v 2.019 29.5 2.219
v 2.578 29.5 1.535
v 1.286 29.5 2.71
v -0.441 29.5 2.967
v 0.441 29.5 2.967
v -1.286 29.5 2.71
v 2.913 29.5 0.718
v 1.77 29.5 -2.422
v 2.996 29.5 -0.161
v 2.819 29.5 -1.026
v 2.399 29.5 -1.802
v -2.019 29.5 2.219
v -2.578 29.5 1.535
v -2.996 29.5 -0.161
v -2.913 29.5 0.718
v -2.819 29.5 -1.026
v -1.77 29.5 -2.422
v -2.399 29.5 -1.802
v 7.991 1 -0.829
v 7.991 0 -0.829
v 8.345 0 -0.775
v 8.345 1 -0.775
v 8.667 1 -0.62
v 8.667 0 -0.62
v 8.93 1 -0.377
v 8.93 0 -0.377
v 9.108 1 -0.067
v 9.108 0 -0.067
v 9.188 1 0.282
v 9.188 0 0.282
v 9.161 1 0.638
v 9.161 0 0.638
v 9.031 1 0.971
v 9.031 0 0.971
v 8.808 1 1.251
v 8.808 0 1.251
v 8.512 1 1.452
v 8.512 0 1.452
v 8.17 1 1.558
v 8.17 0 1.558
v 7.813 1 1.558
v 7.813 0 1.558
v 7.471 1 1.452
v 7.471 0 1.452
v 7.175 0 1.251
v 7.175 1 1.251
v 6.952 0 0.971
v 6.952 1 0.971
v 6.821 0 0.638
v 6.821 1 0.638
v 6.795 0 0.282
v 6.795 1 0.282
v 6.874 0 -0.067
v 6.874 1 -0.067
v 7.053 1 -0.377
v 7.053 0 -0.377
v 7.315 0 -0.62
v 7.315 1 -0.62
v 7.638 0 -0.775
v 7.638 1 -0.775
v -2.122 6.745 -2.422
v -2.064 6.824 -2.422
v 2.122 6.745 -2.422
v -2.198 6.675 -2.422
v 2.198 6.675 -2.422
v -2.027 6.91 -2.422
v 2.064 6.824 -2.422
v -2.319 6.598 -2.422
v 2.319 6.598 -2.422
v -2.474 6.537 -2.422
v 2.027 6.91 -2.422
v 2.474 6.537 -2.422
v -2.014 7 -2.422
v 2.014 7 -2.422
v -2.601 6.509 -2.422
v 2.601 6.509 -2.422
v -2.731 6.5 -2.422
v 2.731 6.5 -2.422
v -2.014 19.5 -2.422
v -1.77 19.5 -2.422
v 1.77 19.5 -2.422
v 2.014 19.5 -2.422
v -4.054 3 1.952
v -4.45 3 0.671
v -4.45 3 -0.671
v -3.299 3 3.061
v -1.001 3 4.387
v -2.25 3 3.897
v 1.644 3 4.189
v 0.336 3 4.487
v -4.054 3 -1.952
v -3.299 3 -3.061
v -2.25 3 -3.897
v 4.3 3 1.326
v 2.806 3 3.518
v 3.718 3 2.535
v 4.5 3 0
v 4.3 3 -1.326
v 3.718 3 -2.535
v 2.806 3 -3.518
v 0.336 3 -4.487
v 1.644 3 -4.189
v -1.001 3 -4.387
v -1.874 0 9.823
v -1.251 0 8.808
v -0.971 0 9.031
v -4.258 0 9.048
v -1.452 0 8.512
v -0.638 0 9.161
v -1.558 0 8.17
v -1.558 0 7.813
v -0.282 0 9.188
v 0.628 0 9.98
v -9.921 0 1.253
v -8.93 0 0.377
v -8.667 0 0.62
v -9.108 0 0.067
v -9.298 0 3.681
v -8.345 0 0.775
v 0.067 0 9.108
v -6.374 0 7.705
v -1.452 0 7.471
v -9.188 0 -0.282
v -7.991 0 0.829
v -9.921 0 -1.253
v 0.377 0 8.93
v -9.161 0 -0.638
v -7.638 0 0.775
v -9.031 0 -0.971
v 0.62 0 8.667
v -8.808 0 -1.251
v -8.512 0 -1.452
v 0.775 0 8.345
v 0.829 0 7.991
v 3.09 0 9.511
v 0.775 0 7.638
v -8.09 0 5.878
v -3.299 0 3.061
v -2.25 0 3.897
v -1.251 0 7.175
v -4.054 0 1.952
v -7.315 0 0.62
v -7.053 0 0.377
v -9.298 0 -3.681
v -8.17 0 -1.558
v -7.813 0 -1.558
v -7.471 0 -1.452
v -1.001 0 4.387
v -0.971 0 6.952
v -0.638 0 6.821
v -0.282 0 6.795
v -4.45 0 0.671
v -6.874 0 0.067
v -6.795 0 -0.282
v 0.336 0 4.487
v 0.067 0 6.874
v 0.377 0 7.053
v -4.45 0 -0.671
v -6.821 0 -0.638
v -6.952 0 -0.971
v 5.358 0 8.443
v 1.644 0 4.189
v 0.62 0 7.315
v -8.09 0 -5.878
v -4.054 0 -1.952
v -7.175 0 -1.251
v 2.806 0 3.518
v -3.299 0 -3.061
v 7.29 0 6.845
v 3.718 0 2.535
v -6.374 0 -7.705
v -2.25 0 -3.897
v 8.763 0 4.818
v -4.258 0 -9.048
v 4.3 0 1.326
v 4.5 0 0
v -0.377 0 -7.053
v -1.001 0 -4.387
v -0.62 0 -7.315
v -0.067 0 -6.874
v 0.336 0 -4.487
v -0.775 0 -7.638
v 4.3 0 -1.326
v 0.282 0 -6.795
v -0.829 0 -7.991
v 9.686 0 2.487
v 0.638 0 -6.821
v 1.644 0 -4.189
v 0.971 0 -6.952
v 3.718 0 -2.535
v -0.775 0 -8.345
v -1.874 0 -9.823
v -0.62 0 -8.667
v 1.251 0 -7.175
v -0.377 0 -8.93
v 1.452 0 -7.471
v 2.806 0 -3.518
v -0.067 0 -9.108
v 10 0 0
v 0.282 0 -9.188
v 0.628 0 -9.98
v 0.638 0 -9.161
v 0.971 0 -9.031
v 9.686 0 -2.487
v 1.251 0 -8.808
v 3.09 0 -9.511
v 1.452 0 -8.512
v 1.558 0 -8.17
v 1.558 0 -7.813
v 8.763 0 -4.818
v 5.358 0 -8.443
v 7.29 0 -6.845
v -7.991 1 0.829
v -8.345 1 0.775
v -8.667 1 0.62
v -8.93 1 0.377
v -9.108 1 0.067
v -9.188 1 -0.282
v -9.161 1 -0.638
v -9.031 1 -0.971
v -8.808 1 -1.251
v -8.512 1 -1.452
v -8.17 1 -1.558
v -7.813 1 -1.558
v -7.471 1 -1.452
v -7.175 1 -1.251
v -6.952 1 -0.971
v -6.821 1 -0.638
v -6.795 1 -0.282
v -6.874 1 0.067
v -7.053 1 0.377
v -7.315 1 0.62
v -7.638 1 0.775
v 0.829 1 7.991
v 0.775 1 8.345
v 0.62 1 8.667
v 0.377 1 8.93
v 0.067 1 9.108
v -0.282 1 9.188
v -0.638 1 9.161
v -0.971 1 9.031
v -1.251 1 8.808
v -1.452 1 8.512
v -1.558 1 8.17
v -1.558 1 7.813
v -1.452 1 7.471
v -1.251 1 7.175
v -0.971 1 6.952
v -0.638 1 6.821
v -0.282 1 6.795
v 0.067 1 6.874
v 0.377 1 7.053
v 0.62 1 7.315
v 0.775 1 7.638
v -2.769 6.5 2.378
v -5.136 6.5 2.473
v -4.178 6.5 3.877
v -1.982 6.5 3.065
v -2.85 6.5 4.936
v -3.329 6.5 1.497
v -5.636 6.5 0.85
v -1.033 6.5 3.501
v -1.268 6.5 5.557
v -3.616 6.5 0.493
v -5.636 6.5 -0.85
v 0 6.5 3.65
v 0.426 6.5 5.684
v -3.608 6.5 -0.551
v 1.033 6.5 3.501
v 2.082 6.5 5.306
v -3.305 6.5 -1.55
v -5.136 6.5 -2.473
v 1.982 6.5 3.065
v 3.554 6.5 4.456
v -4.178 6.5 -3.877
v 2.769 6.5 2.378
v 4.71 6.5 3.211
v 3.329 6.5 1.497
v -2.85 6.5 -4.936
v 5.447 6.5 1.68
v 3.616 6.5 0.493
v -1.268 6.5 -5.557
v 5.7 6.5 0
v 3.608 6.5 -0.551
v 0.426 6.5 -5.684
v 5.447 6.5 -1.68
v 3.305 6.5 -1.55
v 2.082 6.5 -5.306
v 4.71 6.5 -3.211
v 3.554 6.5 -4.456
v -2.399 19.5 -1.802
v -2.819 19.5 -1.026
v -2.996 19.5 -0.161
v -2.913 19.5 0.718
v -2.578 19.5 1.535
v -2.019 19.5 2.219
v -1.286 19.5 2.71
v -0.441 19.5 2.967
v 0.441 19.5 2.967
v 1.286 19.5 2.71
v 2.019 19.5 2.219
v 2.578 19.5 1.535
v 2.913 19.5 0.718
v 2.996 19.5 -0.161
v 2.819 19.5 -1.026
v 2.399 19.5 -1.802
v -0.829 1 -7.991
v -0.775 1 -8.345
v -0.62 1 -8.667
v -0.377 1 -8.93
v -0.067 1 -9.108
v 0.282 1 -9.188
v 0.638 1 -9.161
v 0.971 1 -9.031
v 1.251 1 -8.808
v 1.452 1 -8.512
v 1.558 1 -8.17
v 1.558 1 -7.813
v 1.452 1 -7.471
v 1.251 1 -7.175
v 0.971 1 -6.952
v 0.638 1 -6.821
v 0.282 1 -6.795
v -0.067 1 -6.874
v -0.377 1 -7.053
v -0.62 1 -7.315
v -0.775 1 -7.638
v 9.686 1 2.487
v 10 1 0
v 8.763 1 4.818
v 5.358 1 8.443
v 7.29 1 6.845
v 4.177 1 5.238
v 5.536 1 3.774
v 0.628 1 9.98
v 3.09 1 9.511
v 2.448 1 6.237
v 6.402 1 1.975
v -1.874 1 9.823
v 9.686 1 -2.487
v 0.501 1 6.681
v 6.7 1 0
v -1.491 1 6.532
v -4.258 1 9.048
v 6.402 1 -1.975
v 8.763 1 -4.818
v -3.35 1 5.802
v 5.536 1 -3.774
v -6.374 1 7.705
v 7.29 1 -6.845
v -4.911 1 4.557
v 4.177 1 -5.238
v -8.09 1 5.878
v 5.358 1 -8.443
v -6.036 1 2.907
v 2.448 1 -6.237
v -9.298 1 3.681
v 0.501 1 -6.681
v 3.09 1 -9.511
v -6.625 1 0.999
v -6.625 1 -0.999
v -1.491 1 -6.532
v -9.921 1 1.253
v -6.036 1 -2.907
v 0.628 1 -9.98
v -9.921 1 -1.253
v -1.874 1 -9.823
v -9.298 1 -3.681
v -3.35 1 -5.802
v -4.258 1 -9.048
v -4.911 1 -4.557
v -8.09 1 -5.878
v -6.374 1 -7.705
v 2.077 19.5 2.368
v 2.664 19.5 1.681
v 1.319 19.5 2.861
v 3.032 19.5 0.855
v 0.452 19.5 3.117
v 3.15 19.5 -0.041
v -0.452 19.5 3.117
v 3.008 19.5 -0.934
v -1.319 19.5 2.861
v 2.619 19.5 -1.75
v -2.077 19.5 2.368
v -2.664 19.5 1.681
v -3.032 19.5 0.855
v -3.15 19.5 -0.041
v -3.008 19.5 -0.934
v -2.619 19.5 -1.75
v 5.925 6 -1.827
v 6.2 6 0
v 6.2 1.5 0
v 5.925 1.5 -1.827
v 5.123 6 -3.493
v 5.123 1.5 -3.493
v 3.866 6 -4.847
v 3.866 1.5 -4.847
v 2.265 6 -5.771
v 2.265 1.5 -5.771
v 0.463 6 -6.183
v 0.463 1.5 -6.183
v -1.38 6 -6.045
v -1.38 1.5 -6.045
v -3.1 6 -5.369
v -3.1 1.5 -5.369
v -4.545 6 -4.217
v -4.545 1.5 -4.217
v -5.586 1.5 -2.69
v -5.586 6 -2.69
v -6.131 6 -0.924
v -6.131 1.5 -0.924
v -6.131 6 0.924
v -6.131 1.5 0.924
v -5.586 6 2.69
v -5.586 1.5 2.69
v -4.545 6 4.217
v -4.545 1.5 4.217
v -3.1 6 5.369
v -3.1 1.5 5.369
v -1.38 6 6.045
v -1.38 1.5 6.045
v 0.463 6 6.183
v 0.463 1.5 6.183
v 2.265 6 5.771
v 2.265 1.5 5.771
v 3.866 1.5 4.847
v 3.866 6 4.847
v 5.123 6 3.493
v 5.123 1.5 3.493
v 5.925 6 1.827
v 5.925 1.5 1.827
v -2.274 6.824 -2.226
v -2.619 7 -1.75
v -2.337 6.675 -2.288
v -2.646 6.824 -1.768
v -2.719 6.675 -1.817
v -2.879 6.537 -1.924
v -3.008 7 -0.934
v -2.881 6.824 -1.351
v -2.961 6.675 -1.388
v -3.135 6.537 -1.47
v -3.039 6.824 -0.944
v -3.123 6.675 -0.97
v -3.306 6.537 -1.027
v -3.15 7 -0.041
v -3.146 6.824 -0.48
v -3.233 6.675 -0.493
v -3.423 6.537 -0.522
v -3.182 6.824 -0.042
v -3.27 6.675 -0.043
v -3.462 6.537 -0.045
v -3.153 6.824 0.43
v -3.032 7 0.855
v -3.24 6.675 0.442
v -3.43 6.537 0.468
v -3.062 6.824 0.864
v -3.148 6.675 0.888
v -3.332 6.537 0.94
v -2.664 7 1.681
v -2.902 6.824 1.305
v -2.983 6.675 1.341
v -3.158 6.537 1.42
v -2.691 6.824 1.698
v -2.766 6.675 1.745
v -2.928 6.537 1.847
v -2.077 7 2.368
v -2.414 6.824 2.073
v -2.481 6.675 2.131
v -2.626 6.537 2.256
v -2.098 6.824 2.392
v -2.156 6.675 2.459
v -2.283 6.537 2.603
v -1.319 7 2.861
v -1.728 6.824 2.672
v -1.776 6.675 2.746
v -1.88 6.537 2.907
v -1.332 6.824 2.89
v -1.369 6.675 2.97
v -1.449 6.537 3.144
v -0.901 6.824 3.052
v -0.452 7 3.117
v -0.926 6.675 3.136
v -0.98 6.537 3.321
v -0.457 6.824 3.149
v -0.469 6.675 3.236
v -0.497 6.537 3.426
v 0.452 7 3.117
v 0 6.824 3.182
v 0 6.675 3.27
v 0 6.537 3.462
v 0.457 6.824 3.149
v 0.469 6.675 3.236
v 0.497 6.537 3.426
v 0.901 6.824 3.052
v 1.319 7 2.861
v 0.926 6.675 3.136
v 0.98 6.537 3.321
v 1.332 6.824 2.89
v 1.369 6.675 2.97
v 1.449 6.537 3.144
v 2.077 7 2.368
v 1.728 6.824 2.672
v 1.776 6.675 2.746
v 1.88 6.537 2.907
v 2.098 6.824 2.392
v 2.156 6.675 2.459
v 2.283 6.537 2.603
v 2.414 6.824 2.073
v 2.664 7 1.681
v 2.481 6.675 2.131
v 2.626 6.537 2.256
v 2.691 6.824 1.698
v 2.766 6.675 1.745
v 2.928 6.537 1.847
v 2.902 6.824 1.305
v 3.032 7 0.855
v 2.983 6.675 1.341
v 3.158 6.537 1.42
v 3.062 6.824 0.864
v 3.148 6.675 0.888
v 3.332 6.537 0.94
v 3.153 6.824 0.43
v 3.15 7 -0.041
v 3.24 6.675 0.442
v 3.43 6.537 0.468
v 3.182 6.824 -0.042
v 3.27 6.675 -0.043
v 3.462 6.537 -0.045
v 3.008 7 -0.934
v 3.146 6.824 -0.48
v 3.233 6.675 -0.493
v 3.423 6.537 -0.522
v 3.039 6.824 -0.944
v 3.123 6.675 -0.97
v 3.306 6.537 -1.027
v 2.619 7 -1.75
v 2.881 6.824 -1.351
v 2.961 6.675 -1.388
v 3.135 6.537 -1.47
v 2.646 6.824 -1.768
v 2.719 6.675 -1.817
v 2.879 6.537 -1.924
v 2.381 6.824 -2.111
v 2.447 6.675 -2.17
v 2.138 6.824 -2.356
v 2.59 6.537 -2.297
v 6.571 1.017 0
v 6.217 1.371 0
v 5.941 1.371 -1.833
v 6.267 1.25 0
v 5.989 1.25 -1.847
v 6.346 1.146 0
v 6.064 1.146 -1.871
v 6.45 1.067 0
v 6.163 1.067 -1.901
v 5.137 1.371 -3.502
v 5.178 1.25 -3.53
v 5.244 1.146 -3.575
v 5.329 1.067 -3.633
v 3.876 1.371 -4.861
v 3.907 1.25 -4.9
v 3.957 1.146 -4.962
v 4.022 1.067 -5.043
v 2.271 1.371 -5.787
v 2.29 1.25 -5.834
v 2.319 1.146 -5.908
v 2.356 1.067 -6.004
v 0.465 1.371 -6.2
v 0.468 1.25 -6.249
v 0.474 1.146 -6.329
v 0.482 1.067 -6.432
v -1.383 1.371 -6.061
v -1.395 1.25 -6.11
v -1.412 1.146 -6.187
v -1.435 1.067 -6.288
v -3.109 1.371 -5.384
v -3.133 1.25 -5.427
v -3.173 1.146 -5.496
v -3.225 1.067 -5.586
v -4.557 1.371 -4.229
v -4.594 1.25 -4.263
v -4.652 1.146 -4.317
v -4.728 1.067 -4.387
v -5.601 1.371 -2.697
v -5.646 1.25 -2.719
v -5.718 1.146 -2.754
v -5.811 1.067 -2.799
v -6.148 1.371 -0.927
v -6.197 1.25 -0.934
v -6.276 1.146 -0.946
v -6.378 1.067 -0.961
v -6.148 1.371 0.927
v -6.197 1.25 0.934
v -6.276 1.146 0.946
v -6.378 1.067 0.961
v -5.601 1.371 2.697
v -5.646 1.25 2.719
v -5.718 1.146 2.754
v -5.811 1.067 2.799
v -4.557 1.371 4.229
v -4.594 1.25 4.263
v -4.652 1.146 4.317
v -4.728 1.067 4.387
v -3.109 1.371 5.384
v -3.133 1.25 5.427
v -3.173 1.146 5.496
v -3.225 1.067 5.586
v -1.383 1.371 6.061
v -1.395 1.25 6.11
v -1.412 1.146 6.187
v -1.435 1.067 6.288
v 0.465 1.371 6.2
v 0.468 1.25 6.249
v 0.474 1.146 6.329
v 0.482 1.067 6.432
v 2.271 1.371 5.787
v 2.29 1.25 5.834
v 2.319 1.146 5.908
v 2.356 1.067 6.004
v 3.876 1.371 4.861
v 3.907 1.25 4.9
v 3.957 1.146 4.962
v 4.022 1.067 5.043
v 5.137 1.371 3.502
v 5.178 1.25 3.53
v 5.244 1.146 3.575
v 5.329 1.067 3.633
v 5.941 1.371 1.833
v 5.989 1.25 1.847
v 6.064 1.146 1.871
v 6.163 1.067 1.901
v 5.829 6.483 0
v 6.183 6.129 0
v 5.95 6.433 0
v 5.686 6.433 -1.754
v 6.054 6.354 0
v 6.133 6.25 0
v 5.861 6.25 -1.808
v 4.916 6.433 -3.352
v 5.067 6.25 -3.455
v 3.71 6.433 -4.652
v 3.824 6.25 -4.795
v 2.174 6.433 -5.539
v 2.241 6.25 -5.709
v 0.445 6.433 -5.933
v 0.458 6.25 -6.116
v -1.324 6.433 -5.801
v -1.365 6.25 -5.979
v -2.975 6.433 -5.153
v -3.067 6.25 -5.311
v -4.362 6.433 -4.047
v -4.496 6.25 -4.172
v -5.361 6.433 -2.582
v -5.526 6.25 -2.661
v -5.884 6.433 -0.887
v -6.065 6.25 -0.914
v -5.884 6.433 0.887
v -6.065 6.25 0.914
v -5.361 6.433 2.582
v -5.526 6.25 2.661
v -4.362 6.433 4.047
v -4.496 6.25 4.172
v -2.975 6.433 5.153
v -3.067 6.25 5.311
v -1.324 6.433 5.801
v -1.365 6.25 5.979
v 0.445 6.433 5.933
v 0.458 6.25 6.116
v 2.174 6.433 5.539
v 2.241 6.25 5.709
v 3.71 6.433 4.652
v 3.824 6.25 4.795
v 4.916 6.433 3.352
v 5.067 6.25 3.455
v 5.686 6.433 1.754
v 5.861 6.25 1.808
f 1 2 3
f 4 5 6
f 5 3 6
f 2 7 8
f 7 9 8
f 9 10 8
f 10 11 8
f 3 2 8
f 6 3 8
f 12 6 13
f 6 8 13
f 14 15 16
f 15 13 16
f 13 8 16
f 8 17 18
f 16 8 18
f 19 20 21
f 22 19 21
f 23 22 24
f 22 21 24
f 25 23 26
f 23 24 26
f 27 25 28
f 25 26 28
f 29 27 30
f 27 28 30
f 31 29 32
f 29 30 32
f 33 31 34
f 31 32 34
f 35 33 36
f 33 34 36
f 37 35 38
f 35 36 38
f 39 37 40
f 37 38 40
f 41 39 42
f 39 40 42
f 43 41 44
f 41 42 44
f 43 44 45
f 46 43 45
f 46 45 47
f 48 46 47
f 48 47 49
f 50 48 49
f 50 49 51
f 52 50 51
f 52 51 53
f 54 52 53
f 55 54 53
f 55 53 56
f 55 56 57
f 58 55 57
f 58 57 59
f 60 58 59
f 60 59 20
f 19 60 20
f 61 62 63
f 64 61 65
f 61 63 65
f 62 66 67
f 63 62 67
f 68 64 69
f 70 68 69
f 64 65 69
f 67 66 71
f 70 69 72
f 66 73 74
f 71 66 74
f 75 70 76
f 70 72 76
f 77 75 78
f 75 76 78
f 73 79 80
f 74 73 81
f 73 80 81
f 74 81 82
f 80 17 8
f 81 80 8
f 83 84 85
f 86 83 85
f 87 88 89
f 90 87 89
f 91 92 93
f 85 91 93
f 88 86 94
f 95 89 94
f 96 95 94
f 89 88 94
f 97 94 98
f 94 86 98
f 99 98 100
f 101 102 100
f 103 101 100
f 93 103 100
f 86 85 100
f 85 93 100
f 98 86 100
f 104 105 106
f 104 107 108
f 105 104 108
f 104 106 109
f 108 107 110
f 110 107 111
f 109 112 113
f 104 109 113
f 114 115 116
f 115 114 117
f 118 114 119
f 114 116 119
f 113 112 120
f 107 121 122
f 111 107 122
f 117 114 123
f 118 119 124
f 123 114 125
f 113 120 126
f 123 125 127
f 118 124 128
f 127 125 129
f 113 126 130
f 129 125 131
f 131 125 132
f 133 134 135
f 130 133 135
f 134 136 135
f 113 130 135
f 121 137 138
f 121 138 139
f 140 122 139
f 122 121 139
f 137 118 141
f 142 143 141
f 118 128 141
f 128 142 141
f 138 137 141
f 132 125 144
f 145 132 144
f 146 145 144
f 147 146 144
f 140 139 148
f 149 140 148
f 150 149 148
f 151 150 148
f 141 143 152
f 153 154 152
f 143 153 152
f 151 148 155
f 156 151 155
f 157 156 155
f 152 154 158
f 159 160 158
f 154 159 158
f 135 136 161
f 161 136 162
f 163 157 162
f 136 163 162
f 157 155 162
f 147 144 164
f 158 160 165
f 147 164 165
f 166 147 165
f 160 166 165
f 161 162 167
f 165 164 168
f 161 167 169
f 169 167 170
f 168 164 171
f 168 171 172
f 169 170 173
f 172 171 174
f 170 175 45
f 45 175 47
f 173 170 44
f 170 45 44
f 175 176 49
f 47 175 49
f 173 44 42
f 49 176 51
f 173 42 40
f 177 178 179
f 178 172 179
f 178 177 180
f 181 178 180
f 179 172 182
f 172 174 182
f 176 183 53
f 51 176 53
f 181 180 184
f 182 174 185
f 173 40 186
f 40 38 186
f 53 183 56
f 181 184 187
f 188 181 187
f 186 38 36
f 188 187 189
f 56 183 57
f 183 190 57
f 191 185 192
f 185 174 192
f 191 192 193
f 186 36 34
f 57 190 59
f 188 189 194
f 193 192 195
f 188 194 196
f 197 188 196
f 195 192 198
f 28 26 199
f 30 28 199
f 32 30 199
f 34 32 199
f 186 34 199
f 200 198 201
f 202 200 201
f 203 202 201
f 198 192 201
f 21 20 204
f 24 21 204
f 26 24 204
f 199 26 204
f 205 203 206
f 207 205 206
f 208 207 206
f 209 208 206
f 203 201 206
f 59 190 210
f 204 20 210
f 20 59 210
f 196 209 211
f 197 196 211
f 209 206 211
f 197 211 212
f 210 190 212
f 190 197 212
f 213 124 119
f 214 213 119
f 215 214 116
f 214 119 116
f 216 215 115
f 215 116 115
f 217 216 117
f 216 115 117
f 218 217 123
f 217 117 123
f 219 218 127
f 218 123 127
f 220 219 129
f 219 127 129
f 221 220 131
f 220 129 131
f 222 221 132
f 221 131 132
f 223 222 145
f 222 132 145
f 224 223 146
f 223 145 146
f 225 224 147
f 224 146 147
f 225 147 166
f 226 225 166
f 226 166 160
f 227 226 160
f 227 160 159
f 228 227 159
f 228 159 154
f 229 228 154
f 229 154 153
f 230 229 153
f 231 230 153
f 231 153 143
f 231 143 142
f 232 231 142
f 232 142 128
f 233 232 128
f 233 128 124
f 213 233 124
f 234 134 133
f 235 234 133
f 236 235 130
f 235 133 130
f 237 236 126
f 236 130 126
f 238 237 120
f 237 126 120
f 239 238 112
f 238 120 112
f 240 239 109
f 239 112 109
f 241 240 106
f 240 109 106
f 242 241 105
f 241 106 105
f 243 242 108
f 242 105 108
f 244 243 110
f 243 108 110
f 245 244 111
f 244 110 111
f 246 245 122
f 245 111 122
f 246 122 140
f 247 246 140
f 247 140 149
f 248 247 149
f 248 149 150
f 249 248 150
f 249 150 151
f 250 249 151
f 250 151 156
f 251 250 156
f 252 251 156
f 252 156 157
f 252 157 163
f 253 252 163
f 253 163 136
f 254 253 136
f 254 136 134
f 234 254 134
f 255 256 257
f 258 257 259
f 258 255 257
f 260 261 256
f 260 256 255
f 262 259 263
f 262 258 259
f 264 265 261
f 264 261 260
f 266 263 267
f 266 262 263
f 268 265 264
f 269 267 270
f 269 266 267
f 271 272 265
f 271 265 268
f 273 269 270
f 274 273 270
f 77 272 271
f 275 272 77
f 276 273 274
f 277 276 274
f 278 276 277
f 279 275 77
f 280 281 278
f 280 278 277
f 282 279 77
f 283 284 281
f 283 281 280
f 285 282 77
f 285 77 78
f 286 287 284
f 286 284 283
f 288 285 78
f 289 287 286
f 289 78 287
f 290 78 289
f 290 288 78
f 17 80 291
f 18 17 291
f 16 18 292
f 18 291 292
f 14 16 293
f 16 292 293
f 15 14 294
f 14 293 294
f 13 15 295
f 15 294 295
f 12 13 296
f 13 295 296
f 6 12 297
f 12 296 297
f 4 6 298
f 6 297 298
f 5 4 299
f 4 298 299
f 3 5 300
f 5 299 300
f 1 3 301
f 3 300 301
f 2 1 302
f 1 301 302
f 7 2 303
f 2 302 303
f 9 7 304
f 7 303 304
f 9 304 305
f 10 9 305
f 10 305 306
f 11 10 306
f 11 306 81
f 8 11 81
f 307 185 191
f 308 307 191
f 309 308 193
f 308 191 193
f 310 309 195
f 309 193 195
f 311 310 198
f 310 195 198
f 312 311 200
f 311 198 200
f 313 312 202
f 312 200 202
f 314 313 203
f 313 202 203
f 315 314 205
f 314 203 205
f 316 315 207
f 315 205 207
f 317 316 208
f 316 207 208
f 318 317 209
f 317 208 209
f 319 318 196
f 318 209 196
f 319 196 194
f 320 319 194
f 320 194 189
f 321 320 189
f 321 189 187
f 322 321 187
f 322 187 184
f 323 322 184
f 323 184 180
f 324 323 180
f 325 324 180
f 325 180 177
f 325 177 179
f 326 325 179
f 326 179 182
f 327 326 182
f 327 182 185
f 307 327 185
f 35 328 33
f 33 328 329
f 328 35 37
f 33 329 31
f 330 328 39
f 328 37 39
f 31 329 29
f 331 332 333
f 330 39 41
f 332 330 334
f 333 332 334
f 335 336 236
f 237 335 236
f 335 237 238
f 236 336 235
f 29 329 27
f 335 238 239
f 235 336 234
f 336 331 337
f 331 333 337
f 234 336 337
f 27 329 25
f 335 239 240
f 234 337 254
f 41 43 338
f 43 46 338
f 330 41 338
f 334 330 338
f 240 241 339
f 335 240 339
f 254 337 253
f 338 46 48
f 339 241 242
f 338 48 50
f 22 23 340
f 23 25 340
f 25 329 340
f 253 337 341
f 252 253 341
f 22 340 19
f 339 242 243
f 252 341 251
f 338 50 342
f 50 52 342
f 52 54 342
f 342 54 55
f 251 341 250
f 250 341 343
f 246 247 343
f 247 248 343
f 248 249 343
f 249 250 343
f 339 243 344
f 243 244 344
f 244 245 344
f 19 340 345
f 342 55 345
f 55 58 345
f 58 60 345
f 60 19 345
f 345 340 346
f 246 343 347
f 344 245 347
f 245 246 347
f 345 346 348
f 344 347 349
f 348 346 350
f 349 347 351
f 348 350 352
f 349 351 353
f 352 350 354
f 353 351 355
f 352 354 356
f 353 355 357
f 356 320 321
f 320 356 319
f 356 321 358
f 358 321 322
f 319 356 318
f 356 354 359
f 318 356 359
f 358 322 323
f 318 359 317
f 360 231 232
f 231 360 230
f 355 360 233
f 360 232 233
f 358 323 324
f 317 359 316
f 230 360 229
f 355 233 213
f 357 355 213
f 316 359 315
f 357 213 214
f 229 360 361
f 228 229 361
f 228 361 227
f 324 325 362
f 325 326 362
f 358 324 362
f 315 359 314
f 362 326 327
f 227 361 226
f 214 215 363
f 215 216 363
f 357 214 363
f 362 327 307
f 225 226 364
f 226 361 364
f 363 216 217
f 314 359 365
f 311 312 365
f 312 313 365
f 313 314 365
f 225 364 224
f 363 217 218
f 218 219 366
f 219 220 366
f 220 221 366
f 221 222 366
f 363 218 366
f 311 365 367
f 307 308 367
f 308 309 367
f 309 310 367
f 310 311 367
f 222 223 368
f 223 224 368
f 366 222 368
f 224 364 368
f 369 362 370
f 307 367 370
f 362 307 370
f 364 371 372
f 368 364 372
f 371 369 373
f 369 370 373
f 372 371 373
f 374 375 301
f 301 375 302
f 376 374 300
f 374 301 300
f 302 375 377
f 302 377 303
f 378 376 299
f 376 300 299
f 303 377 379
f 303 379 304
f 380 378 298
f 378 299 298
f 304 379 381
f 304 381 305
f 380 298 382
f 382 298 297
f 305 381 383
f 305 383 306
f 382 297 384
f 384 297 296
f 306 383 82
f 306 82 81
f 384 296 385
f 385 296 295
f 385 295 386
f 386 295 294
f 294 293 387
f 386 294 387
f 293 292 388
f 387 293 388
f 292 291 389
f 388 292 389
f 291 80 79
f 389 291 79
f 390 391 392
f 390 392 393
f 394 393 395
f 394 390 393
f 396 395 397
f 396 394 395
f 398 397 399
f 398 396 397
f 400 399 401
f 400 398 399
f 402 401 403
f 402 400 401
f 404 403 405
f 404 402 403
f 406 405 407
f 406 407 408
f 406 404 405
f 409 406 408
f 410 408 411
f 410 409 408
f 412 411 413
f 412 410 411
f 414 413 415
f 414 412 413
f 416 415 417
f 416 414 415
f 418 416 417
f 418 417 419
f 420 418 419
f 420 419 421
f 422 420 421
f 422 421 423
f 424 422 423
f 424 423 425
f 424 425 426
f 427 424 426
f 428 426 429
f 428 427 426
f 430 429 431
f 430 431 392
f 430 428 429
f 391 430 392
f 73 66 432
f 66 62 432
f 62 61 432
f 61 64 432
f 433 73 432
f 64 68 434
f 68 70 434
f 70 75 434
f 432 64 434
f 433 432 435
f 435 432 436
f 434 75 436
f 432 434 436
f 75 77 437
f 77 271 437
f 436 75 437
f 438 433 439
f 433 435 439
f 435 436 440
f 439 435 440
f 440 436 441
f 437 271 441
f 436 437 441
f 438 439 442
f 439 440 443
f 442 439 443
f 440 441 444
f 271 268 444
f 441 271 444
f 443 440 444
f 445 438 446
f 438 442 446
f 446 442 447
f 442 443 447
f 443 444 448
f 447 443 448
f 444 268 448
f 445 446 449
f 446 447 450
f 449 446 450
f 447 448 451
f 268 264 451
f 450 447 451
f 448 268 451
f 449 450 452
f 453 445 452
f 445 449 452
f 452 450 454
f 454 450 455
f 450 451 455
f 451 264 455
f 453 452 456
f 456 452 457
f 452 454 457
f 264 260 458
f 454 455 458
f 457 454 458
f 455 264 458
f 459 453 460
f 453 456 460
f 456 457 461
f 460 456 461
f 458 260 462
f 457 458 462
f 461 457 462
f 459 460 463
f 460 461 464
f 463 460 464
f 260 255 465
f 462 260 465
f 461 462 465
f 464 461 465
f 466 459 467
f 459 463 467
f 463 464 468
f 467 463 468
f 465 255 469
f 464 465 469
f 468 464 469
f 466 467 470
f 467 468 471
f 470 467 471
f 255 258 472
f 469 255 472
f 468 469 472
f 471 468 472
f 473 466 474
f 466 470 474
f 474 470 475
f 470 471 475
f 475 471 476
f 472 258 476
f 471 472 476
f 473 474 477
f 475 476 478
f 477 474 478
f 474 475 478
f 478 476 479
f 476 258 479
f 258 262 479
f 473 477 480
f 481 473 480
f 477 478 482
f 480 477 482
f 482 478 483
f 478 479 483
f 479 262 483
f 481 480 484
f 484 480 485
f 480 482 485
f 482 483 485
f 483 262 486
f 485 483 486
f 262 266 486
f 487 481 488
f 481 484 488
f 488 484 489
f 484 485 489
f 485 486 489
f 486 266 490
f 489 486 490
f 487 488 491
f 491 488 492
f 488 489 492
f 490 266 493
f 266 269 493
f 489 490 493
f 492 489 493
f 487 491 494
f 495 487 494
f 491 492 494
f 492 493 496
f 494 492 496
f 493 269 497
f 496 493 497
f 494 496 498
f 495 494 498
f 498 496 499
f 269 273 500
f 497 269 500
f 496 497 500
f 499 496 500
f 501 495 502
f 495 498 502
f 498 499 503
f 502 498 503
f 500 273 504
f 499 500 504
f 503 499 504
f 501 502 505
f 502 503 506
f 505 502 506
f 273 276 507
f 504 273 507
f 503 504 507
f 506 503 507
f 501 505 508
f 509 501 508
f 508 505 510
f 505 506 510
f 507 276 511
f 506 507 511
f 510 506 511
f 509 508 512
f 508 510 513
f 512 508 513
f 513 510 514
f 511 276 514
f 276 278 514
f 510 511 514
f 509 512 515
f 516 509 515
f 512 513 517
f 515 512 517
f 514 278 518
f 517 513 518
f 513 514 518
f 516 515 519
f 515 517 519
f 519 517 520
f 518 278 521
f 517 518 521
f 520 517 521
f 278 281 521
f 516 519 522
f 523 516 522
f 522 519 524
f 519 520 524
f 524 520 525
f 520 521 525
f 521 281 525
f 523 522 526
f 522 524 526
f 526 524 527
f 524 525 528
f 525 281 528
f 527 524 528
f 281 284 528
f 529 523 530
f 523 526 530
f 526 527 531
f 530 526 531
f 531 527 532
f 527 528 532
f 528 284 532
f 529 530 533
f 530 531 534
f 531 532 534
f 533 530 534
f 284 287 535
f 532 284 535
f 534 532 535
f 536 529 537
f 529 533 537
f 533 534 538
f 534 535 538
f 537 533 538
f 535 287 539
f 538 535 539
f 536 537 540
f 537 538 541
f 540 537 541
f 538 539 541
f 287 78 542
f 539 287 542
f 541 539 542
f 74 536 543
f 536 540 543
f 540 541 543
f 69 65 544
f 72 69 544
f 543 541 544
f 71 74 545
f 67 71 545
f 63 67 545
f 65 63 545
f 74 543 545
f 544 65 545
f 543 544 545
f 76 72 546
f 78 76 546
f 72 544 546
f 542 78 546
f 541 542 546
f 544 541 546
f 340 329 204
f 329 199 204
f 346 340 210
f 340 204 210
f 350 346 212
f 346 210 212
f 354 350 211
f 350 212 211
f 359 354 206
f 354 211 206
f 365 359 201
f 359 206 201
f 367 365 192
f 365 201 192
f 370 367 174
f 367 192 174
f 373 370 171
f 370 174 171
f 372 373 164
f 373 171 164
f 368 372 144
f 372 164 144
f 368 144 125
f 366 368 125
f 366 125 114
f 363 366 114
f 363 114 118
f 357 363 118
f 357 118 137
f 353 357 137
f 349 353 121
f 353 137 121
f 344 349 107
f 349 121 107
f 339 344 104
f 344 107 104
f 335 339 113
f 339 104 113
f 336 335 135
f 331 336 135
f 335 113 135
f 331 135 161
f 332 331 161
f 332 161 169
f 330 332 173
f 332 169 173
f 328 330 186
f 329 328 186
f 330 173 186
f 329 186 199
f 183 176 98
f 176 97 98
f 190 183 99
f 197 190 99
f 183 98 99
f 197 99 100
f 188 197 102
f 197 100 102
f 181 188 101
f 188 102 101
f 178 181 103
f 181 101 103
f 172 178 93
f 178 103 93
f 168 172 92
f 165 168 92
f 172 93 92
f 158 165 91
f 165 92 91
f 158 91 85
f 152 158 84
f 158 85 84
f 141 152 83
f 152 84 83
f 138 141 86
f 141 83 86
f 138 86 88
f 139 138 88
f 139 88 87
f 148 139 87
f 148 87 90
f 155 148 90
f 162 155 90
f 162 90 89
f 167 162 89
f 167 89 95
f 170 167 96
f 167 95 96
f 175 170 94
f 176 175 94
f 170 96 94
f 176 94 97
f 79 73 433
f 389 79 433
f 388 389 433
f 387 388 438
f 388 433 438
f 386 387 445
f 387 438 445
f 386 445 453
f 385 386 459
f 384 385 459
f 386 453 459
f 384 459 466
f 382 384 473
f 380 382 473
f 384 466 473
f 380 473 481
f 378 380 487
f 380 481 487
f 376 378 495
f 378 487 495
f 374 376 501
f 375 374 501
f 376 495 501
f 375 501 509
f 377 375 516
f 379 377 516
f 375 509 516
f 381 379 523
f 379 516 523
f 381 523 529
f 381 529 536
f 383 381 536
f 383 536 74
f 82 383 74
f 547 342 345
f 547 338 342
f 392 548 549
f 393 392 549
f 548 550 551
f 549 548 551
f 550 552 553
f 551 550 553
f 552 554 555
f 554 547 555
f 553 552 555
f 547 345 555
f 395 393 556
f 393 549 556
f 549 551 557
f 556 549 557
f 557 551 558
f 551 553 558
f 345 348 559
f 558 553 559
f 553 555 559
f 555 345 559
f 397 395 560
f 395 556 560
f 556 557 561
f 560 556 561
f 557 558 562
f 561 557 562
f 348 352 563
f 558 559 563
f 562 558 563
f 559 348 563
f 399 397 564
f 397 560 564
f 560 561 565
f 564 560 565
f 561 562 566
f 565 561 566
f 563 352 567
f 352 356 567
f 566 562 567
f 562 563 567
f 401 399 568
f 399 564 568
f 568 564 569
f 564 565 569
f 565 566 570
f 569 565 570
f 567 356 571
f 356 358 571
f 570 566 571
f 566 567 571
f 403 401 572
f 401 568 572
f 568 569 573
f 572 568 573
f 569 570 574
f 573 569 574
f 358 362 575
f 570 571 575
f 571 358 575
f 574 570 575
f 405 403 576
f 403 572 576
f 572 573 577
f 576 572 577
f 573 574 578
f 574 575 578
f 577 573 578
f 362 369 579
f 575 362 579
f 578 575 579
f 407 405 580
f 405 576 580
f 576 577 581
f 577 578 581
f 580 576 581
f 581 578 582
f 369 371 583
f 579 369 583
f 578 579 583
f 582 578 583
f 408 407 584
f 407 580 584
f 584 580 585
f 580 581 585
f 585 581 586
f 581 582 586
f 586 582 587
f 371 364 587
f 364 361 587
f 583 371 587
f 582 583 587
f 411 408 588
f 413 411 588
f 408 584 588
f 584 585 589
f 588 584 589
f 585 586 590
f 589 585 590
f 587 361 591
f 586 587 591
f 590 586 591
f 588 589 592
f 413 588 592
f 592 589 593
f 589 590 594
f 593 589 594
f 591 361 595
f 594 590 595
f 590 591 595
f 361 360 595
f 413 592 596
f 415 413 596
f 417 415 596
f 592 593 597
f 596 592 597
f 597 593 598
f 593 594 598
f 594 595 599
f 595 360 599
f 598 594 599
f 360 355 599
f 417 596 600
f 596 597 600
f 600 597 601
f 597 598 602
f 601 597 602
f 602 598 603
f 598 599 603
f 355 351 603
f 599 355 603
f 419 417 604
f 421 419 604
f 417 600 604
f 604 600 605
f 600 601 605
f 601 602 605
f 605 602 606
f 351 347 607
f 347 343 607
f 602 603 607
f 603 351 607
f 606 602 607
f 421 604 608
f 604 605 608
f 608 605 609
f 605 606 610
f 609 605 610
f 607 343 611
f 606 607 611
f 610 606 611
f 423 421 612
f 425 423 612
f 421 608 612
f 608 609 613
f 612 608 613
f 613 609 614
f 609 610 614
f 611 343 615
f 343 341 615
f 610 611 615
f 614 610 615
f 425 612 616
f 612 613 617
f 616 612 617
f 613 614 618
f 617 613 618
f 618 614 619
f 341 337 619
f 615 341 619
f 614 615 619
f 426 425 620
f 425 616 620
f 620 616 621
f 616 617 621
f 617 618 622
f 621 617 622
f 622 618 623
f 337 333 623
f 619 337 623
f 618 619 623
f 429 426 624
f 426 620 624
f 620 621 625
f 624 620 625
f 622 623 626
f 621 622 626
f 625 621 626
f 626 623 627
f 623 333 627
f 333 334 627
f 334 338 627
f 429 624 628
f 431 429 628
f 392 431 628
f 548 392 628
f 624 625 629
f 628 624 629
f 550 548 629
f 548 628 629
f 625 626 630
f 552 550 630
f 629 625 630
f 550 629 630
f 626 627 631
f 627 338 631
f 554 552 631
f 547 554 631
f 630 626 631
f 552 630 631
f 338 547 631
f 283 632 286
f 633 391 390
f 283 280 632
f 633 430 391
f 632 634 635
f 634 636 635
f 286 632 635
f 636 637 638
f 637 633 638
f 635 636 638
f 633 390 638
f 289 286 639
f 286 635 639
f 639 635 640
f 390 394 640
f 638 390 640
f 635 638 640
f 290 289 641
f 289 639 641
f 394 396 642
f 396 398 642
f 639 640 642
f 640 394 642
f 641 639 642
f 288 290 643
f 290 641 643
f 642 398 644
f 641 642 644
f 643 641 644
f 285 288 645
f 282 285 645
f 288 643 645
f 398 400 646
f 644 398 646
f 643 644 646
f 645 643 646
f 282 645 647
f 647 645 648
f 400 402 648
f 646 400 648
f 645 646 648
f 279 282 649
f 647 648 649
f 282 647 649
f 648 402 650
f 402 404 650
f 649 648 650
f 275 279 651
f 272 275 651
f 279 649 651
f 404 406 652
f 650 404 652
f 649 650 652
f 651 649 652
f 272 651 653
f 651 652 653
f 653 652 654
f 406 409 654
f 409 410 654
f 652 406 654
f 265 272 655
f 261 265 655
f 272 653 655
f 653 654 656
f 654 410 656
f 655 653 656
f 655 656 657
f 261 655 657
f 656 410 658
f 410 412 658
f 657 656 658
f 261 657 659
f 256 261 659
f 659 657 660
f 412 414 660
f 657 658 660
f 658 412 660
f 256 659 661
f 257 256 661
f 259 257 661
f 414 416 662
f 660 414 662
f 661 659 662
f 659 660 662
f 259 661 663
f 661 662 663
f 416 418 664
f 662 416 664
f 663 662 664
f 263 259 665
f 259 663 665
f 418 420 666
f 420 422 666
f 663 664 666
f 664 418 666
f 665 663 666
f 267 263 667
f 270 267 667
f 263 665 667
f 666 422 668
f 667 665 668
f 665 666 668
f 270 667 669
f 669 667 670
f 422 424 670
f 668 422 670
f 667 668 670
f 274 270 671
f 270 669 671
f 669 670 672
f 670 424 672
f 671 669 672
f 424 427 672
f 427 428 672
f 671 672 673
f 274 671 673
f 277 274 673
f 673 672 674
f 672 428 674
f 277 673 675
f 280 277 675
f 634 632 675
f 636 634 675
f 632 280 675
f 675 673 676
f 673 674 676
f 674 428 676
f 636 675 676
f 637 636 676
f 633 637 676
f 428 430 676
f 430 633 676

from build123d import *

# Parameters (mm, degrees)
ESQUISSE3_W                  = 6.57785754
ESQUISSE3_H                  = 1.386048805
ENL_V_MAT_EXTRU_1_DEPTH      = 23
D_GAGEMENT_M21_D             = 2.4
D_GAGEMENT_M21_DEPTH         = 1.001
R_P_TITION_CIRCULAIRE1_COUNT = 4
FILLET1_R                    = 0.5


with BuildPart() as part:
    # Esquisse2 → Révolution2 (revolve)
    with BuildSketch(Plane.XY):
        Polygon((0, 29.5), (3, 29.5), (3, 19.5), (3.15, 19.5), (3.15, 6.5), (6.2, 6.5), (6.2, 3), (6.2, 1), (10, 1), (10, 0), (4.5, 0), (4.5, 3), (0, 3), align=None)
    revolve(axis=Axis((0, 3, 0), (0, 1, 0)))

    # Esquisse3 → Enlèv. mat.-Extru.1 (cut)
    with BuildSketch(Plane(origin=(0, 29.5, 0), x_dir=(1, 0, 0), z_dir=(0, 1, 0))):
        with Locations((-0.352413472, 3.114928535)):
            Rectangle(ESQUISSE3_W, ESQUISSE3_H)
    extrude(amount=-ENL_V_MAT_EXTRU_1_DEPTH, mode=Mode.SUBTRACT)

    # Dégagement M21
    with Locations(Plane(origin=(0, 1, 0), x_dir=(1, 0, 0), z_dir=(0, 1, 0))):
        with Locations((0.371303159, 7.991378727)):
            d_gagement_m21 = Hole(D_GAGEMENT_M21_D / 2, depth=D_GAGEMENT_M21_DEPTH)

    # Répétition circulaire1: Dégagement M21 ×4 about axis
    r_p_tition_circulaire1_axis = Axis((0, 0, 0), (0, 1, 0))
    for i in range(1, R_P_TITION_CIRCULAIRE1_COUNT):
        add(d_gagement_m21.rotate(r_p_tition_circulaire1_axis, i * 360 / R_P_TITION_CIRCULAIRE1_COUNT), mode=Mode.SUBTRACT)

    # Fillet1
    fillet1_edges = [part.edges().sort_by_distance(p)[0] for p in [
        (-6.2, 1, 0),
        (-6.2, 6.5, 0),
        (0, 6.5, 3.15),
    ]]
    fillet(fillet1_edges, radius=FILLET1_R)


solid = part.part
